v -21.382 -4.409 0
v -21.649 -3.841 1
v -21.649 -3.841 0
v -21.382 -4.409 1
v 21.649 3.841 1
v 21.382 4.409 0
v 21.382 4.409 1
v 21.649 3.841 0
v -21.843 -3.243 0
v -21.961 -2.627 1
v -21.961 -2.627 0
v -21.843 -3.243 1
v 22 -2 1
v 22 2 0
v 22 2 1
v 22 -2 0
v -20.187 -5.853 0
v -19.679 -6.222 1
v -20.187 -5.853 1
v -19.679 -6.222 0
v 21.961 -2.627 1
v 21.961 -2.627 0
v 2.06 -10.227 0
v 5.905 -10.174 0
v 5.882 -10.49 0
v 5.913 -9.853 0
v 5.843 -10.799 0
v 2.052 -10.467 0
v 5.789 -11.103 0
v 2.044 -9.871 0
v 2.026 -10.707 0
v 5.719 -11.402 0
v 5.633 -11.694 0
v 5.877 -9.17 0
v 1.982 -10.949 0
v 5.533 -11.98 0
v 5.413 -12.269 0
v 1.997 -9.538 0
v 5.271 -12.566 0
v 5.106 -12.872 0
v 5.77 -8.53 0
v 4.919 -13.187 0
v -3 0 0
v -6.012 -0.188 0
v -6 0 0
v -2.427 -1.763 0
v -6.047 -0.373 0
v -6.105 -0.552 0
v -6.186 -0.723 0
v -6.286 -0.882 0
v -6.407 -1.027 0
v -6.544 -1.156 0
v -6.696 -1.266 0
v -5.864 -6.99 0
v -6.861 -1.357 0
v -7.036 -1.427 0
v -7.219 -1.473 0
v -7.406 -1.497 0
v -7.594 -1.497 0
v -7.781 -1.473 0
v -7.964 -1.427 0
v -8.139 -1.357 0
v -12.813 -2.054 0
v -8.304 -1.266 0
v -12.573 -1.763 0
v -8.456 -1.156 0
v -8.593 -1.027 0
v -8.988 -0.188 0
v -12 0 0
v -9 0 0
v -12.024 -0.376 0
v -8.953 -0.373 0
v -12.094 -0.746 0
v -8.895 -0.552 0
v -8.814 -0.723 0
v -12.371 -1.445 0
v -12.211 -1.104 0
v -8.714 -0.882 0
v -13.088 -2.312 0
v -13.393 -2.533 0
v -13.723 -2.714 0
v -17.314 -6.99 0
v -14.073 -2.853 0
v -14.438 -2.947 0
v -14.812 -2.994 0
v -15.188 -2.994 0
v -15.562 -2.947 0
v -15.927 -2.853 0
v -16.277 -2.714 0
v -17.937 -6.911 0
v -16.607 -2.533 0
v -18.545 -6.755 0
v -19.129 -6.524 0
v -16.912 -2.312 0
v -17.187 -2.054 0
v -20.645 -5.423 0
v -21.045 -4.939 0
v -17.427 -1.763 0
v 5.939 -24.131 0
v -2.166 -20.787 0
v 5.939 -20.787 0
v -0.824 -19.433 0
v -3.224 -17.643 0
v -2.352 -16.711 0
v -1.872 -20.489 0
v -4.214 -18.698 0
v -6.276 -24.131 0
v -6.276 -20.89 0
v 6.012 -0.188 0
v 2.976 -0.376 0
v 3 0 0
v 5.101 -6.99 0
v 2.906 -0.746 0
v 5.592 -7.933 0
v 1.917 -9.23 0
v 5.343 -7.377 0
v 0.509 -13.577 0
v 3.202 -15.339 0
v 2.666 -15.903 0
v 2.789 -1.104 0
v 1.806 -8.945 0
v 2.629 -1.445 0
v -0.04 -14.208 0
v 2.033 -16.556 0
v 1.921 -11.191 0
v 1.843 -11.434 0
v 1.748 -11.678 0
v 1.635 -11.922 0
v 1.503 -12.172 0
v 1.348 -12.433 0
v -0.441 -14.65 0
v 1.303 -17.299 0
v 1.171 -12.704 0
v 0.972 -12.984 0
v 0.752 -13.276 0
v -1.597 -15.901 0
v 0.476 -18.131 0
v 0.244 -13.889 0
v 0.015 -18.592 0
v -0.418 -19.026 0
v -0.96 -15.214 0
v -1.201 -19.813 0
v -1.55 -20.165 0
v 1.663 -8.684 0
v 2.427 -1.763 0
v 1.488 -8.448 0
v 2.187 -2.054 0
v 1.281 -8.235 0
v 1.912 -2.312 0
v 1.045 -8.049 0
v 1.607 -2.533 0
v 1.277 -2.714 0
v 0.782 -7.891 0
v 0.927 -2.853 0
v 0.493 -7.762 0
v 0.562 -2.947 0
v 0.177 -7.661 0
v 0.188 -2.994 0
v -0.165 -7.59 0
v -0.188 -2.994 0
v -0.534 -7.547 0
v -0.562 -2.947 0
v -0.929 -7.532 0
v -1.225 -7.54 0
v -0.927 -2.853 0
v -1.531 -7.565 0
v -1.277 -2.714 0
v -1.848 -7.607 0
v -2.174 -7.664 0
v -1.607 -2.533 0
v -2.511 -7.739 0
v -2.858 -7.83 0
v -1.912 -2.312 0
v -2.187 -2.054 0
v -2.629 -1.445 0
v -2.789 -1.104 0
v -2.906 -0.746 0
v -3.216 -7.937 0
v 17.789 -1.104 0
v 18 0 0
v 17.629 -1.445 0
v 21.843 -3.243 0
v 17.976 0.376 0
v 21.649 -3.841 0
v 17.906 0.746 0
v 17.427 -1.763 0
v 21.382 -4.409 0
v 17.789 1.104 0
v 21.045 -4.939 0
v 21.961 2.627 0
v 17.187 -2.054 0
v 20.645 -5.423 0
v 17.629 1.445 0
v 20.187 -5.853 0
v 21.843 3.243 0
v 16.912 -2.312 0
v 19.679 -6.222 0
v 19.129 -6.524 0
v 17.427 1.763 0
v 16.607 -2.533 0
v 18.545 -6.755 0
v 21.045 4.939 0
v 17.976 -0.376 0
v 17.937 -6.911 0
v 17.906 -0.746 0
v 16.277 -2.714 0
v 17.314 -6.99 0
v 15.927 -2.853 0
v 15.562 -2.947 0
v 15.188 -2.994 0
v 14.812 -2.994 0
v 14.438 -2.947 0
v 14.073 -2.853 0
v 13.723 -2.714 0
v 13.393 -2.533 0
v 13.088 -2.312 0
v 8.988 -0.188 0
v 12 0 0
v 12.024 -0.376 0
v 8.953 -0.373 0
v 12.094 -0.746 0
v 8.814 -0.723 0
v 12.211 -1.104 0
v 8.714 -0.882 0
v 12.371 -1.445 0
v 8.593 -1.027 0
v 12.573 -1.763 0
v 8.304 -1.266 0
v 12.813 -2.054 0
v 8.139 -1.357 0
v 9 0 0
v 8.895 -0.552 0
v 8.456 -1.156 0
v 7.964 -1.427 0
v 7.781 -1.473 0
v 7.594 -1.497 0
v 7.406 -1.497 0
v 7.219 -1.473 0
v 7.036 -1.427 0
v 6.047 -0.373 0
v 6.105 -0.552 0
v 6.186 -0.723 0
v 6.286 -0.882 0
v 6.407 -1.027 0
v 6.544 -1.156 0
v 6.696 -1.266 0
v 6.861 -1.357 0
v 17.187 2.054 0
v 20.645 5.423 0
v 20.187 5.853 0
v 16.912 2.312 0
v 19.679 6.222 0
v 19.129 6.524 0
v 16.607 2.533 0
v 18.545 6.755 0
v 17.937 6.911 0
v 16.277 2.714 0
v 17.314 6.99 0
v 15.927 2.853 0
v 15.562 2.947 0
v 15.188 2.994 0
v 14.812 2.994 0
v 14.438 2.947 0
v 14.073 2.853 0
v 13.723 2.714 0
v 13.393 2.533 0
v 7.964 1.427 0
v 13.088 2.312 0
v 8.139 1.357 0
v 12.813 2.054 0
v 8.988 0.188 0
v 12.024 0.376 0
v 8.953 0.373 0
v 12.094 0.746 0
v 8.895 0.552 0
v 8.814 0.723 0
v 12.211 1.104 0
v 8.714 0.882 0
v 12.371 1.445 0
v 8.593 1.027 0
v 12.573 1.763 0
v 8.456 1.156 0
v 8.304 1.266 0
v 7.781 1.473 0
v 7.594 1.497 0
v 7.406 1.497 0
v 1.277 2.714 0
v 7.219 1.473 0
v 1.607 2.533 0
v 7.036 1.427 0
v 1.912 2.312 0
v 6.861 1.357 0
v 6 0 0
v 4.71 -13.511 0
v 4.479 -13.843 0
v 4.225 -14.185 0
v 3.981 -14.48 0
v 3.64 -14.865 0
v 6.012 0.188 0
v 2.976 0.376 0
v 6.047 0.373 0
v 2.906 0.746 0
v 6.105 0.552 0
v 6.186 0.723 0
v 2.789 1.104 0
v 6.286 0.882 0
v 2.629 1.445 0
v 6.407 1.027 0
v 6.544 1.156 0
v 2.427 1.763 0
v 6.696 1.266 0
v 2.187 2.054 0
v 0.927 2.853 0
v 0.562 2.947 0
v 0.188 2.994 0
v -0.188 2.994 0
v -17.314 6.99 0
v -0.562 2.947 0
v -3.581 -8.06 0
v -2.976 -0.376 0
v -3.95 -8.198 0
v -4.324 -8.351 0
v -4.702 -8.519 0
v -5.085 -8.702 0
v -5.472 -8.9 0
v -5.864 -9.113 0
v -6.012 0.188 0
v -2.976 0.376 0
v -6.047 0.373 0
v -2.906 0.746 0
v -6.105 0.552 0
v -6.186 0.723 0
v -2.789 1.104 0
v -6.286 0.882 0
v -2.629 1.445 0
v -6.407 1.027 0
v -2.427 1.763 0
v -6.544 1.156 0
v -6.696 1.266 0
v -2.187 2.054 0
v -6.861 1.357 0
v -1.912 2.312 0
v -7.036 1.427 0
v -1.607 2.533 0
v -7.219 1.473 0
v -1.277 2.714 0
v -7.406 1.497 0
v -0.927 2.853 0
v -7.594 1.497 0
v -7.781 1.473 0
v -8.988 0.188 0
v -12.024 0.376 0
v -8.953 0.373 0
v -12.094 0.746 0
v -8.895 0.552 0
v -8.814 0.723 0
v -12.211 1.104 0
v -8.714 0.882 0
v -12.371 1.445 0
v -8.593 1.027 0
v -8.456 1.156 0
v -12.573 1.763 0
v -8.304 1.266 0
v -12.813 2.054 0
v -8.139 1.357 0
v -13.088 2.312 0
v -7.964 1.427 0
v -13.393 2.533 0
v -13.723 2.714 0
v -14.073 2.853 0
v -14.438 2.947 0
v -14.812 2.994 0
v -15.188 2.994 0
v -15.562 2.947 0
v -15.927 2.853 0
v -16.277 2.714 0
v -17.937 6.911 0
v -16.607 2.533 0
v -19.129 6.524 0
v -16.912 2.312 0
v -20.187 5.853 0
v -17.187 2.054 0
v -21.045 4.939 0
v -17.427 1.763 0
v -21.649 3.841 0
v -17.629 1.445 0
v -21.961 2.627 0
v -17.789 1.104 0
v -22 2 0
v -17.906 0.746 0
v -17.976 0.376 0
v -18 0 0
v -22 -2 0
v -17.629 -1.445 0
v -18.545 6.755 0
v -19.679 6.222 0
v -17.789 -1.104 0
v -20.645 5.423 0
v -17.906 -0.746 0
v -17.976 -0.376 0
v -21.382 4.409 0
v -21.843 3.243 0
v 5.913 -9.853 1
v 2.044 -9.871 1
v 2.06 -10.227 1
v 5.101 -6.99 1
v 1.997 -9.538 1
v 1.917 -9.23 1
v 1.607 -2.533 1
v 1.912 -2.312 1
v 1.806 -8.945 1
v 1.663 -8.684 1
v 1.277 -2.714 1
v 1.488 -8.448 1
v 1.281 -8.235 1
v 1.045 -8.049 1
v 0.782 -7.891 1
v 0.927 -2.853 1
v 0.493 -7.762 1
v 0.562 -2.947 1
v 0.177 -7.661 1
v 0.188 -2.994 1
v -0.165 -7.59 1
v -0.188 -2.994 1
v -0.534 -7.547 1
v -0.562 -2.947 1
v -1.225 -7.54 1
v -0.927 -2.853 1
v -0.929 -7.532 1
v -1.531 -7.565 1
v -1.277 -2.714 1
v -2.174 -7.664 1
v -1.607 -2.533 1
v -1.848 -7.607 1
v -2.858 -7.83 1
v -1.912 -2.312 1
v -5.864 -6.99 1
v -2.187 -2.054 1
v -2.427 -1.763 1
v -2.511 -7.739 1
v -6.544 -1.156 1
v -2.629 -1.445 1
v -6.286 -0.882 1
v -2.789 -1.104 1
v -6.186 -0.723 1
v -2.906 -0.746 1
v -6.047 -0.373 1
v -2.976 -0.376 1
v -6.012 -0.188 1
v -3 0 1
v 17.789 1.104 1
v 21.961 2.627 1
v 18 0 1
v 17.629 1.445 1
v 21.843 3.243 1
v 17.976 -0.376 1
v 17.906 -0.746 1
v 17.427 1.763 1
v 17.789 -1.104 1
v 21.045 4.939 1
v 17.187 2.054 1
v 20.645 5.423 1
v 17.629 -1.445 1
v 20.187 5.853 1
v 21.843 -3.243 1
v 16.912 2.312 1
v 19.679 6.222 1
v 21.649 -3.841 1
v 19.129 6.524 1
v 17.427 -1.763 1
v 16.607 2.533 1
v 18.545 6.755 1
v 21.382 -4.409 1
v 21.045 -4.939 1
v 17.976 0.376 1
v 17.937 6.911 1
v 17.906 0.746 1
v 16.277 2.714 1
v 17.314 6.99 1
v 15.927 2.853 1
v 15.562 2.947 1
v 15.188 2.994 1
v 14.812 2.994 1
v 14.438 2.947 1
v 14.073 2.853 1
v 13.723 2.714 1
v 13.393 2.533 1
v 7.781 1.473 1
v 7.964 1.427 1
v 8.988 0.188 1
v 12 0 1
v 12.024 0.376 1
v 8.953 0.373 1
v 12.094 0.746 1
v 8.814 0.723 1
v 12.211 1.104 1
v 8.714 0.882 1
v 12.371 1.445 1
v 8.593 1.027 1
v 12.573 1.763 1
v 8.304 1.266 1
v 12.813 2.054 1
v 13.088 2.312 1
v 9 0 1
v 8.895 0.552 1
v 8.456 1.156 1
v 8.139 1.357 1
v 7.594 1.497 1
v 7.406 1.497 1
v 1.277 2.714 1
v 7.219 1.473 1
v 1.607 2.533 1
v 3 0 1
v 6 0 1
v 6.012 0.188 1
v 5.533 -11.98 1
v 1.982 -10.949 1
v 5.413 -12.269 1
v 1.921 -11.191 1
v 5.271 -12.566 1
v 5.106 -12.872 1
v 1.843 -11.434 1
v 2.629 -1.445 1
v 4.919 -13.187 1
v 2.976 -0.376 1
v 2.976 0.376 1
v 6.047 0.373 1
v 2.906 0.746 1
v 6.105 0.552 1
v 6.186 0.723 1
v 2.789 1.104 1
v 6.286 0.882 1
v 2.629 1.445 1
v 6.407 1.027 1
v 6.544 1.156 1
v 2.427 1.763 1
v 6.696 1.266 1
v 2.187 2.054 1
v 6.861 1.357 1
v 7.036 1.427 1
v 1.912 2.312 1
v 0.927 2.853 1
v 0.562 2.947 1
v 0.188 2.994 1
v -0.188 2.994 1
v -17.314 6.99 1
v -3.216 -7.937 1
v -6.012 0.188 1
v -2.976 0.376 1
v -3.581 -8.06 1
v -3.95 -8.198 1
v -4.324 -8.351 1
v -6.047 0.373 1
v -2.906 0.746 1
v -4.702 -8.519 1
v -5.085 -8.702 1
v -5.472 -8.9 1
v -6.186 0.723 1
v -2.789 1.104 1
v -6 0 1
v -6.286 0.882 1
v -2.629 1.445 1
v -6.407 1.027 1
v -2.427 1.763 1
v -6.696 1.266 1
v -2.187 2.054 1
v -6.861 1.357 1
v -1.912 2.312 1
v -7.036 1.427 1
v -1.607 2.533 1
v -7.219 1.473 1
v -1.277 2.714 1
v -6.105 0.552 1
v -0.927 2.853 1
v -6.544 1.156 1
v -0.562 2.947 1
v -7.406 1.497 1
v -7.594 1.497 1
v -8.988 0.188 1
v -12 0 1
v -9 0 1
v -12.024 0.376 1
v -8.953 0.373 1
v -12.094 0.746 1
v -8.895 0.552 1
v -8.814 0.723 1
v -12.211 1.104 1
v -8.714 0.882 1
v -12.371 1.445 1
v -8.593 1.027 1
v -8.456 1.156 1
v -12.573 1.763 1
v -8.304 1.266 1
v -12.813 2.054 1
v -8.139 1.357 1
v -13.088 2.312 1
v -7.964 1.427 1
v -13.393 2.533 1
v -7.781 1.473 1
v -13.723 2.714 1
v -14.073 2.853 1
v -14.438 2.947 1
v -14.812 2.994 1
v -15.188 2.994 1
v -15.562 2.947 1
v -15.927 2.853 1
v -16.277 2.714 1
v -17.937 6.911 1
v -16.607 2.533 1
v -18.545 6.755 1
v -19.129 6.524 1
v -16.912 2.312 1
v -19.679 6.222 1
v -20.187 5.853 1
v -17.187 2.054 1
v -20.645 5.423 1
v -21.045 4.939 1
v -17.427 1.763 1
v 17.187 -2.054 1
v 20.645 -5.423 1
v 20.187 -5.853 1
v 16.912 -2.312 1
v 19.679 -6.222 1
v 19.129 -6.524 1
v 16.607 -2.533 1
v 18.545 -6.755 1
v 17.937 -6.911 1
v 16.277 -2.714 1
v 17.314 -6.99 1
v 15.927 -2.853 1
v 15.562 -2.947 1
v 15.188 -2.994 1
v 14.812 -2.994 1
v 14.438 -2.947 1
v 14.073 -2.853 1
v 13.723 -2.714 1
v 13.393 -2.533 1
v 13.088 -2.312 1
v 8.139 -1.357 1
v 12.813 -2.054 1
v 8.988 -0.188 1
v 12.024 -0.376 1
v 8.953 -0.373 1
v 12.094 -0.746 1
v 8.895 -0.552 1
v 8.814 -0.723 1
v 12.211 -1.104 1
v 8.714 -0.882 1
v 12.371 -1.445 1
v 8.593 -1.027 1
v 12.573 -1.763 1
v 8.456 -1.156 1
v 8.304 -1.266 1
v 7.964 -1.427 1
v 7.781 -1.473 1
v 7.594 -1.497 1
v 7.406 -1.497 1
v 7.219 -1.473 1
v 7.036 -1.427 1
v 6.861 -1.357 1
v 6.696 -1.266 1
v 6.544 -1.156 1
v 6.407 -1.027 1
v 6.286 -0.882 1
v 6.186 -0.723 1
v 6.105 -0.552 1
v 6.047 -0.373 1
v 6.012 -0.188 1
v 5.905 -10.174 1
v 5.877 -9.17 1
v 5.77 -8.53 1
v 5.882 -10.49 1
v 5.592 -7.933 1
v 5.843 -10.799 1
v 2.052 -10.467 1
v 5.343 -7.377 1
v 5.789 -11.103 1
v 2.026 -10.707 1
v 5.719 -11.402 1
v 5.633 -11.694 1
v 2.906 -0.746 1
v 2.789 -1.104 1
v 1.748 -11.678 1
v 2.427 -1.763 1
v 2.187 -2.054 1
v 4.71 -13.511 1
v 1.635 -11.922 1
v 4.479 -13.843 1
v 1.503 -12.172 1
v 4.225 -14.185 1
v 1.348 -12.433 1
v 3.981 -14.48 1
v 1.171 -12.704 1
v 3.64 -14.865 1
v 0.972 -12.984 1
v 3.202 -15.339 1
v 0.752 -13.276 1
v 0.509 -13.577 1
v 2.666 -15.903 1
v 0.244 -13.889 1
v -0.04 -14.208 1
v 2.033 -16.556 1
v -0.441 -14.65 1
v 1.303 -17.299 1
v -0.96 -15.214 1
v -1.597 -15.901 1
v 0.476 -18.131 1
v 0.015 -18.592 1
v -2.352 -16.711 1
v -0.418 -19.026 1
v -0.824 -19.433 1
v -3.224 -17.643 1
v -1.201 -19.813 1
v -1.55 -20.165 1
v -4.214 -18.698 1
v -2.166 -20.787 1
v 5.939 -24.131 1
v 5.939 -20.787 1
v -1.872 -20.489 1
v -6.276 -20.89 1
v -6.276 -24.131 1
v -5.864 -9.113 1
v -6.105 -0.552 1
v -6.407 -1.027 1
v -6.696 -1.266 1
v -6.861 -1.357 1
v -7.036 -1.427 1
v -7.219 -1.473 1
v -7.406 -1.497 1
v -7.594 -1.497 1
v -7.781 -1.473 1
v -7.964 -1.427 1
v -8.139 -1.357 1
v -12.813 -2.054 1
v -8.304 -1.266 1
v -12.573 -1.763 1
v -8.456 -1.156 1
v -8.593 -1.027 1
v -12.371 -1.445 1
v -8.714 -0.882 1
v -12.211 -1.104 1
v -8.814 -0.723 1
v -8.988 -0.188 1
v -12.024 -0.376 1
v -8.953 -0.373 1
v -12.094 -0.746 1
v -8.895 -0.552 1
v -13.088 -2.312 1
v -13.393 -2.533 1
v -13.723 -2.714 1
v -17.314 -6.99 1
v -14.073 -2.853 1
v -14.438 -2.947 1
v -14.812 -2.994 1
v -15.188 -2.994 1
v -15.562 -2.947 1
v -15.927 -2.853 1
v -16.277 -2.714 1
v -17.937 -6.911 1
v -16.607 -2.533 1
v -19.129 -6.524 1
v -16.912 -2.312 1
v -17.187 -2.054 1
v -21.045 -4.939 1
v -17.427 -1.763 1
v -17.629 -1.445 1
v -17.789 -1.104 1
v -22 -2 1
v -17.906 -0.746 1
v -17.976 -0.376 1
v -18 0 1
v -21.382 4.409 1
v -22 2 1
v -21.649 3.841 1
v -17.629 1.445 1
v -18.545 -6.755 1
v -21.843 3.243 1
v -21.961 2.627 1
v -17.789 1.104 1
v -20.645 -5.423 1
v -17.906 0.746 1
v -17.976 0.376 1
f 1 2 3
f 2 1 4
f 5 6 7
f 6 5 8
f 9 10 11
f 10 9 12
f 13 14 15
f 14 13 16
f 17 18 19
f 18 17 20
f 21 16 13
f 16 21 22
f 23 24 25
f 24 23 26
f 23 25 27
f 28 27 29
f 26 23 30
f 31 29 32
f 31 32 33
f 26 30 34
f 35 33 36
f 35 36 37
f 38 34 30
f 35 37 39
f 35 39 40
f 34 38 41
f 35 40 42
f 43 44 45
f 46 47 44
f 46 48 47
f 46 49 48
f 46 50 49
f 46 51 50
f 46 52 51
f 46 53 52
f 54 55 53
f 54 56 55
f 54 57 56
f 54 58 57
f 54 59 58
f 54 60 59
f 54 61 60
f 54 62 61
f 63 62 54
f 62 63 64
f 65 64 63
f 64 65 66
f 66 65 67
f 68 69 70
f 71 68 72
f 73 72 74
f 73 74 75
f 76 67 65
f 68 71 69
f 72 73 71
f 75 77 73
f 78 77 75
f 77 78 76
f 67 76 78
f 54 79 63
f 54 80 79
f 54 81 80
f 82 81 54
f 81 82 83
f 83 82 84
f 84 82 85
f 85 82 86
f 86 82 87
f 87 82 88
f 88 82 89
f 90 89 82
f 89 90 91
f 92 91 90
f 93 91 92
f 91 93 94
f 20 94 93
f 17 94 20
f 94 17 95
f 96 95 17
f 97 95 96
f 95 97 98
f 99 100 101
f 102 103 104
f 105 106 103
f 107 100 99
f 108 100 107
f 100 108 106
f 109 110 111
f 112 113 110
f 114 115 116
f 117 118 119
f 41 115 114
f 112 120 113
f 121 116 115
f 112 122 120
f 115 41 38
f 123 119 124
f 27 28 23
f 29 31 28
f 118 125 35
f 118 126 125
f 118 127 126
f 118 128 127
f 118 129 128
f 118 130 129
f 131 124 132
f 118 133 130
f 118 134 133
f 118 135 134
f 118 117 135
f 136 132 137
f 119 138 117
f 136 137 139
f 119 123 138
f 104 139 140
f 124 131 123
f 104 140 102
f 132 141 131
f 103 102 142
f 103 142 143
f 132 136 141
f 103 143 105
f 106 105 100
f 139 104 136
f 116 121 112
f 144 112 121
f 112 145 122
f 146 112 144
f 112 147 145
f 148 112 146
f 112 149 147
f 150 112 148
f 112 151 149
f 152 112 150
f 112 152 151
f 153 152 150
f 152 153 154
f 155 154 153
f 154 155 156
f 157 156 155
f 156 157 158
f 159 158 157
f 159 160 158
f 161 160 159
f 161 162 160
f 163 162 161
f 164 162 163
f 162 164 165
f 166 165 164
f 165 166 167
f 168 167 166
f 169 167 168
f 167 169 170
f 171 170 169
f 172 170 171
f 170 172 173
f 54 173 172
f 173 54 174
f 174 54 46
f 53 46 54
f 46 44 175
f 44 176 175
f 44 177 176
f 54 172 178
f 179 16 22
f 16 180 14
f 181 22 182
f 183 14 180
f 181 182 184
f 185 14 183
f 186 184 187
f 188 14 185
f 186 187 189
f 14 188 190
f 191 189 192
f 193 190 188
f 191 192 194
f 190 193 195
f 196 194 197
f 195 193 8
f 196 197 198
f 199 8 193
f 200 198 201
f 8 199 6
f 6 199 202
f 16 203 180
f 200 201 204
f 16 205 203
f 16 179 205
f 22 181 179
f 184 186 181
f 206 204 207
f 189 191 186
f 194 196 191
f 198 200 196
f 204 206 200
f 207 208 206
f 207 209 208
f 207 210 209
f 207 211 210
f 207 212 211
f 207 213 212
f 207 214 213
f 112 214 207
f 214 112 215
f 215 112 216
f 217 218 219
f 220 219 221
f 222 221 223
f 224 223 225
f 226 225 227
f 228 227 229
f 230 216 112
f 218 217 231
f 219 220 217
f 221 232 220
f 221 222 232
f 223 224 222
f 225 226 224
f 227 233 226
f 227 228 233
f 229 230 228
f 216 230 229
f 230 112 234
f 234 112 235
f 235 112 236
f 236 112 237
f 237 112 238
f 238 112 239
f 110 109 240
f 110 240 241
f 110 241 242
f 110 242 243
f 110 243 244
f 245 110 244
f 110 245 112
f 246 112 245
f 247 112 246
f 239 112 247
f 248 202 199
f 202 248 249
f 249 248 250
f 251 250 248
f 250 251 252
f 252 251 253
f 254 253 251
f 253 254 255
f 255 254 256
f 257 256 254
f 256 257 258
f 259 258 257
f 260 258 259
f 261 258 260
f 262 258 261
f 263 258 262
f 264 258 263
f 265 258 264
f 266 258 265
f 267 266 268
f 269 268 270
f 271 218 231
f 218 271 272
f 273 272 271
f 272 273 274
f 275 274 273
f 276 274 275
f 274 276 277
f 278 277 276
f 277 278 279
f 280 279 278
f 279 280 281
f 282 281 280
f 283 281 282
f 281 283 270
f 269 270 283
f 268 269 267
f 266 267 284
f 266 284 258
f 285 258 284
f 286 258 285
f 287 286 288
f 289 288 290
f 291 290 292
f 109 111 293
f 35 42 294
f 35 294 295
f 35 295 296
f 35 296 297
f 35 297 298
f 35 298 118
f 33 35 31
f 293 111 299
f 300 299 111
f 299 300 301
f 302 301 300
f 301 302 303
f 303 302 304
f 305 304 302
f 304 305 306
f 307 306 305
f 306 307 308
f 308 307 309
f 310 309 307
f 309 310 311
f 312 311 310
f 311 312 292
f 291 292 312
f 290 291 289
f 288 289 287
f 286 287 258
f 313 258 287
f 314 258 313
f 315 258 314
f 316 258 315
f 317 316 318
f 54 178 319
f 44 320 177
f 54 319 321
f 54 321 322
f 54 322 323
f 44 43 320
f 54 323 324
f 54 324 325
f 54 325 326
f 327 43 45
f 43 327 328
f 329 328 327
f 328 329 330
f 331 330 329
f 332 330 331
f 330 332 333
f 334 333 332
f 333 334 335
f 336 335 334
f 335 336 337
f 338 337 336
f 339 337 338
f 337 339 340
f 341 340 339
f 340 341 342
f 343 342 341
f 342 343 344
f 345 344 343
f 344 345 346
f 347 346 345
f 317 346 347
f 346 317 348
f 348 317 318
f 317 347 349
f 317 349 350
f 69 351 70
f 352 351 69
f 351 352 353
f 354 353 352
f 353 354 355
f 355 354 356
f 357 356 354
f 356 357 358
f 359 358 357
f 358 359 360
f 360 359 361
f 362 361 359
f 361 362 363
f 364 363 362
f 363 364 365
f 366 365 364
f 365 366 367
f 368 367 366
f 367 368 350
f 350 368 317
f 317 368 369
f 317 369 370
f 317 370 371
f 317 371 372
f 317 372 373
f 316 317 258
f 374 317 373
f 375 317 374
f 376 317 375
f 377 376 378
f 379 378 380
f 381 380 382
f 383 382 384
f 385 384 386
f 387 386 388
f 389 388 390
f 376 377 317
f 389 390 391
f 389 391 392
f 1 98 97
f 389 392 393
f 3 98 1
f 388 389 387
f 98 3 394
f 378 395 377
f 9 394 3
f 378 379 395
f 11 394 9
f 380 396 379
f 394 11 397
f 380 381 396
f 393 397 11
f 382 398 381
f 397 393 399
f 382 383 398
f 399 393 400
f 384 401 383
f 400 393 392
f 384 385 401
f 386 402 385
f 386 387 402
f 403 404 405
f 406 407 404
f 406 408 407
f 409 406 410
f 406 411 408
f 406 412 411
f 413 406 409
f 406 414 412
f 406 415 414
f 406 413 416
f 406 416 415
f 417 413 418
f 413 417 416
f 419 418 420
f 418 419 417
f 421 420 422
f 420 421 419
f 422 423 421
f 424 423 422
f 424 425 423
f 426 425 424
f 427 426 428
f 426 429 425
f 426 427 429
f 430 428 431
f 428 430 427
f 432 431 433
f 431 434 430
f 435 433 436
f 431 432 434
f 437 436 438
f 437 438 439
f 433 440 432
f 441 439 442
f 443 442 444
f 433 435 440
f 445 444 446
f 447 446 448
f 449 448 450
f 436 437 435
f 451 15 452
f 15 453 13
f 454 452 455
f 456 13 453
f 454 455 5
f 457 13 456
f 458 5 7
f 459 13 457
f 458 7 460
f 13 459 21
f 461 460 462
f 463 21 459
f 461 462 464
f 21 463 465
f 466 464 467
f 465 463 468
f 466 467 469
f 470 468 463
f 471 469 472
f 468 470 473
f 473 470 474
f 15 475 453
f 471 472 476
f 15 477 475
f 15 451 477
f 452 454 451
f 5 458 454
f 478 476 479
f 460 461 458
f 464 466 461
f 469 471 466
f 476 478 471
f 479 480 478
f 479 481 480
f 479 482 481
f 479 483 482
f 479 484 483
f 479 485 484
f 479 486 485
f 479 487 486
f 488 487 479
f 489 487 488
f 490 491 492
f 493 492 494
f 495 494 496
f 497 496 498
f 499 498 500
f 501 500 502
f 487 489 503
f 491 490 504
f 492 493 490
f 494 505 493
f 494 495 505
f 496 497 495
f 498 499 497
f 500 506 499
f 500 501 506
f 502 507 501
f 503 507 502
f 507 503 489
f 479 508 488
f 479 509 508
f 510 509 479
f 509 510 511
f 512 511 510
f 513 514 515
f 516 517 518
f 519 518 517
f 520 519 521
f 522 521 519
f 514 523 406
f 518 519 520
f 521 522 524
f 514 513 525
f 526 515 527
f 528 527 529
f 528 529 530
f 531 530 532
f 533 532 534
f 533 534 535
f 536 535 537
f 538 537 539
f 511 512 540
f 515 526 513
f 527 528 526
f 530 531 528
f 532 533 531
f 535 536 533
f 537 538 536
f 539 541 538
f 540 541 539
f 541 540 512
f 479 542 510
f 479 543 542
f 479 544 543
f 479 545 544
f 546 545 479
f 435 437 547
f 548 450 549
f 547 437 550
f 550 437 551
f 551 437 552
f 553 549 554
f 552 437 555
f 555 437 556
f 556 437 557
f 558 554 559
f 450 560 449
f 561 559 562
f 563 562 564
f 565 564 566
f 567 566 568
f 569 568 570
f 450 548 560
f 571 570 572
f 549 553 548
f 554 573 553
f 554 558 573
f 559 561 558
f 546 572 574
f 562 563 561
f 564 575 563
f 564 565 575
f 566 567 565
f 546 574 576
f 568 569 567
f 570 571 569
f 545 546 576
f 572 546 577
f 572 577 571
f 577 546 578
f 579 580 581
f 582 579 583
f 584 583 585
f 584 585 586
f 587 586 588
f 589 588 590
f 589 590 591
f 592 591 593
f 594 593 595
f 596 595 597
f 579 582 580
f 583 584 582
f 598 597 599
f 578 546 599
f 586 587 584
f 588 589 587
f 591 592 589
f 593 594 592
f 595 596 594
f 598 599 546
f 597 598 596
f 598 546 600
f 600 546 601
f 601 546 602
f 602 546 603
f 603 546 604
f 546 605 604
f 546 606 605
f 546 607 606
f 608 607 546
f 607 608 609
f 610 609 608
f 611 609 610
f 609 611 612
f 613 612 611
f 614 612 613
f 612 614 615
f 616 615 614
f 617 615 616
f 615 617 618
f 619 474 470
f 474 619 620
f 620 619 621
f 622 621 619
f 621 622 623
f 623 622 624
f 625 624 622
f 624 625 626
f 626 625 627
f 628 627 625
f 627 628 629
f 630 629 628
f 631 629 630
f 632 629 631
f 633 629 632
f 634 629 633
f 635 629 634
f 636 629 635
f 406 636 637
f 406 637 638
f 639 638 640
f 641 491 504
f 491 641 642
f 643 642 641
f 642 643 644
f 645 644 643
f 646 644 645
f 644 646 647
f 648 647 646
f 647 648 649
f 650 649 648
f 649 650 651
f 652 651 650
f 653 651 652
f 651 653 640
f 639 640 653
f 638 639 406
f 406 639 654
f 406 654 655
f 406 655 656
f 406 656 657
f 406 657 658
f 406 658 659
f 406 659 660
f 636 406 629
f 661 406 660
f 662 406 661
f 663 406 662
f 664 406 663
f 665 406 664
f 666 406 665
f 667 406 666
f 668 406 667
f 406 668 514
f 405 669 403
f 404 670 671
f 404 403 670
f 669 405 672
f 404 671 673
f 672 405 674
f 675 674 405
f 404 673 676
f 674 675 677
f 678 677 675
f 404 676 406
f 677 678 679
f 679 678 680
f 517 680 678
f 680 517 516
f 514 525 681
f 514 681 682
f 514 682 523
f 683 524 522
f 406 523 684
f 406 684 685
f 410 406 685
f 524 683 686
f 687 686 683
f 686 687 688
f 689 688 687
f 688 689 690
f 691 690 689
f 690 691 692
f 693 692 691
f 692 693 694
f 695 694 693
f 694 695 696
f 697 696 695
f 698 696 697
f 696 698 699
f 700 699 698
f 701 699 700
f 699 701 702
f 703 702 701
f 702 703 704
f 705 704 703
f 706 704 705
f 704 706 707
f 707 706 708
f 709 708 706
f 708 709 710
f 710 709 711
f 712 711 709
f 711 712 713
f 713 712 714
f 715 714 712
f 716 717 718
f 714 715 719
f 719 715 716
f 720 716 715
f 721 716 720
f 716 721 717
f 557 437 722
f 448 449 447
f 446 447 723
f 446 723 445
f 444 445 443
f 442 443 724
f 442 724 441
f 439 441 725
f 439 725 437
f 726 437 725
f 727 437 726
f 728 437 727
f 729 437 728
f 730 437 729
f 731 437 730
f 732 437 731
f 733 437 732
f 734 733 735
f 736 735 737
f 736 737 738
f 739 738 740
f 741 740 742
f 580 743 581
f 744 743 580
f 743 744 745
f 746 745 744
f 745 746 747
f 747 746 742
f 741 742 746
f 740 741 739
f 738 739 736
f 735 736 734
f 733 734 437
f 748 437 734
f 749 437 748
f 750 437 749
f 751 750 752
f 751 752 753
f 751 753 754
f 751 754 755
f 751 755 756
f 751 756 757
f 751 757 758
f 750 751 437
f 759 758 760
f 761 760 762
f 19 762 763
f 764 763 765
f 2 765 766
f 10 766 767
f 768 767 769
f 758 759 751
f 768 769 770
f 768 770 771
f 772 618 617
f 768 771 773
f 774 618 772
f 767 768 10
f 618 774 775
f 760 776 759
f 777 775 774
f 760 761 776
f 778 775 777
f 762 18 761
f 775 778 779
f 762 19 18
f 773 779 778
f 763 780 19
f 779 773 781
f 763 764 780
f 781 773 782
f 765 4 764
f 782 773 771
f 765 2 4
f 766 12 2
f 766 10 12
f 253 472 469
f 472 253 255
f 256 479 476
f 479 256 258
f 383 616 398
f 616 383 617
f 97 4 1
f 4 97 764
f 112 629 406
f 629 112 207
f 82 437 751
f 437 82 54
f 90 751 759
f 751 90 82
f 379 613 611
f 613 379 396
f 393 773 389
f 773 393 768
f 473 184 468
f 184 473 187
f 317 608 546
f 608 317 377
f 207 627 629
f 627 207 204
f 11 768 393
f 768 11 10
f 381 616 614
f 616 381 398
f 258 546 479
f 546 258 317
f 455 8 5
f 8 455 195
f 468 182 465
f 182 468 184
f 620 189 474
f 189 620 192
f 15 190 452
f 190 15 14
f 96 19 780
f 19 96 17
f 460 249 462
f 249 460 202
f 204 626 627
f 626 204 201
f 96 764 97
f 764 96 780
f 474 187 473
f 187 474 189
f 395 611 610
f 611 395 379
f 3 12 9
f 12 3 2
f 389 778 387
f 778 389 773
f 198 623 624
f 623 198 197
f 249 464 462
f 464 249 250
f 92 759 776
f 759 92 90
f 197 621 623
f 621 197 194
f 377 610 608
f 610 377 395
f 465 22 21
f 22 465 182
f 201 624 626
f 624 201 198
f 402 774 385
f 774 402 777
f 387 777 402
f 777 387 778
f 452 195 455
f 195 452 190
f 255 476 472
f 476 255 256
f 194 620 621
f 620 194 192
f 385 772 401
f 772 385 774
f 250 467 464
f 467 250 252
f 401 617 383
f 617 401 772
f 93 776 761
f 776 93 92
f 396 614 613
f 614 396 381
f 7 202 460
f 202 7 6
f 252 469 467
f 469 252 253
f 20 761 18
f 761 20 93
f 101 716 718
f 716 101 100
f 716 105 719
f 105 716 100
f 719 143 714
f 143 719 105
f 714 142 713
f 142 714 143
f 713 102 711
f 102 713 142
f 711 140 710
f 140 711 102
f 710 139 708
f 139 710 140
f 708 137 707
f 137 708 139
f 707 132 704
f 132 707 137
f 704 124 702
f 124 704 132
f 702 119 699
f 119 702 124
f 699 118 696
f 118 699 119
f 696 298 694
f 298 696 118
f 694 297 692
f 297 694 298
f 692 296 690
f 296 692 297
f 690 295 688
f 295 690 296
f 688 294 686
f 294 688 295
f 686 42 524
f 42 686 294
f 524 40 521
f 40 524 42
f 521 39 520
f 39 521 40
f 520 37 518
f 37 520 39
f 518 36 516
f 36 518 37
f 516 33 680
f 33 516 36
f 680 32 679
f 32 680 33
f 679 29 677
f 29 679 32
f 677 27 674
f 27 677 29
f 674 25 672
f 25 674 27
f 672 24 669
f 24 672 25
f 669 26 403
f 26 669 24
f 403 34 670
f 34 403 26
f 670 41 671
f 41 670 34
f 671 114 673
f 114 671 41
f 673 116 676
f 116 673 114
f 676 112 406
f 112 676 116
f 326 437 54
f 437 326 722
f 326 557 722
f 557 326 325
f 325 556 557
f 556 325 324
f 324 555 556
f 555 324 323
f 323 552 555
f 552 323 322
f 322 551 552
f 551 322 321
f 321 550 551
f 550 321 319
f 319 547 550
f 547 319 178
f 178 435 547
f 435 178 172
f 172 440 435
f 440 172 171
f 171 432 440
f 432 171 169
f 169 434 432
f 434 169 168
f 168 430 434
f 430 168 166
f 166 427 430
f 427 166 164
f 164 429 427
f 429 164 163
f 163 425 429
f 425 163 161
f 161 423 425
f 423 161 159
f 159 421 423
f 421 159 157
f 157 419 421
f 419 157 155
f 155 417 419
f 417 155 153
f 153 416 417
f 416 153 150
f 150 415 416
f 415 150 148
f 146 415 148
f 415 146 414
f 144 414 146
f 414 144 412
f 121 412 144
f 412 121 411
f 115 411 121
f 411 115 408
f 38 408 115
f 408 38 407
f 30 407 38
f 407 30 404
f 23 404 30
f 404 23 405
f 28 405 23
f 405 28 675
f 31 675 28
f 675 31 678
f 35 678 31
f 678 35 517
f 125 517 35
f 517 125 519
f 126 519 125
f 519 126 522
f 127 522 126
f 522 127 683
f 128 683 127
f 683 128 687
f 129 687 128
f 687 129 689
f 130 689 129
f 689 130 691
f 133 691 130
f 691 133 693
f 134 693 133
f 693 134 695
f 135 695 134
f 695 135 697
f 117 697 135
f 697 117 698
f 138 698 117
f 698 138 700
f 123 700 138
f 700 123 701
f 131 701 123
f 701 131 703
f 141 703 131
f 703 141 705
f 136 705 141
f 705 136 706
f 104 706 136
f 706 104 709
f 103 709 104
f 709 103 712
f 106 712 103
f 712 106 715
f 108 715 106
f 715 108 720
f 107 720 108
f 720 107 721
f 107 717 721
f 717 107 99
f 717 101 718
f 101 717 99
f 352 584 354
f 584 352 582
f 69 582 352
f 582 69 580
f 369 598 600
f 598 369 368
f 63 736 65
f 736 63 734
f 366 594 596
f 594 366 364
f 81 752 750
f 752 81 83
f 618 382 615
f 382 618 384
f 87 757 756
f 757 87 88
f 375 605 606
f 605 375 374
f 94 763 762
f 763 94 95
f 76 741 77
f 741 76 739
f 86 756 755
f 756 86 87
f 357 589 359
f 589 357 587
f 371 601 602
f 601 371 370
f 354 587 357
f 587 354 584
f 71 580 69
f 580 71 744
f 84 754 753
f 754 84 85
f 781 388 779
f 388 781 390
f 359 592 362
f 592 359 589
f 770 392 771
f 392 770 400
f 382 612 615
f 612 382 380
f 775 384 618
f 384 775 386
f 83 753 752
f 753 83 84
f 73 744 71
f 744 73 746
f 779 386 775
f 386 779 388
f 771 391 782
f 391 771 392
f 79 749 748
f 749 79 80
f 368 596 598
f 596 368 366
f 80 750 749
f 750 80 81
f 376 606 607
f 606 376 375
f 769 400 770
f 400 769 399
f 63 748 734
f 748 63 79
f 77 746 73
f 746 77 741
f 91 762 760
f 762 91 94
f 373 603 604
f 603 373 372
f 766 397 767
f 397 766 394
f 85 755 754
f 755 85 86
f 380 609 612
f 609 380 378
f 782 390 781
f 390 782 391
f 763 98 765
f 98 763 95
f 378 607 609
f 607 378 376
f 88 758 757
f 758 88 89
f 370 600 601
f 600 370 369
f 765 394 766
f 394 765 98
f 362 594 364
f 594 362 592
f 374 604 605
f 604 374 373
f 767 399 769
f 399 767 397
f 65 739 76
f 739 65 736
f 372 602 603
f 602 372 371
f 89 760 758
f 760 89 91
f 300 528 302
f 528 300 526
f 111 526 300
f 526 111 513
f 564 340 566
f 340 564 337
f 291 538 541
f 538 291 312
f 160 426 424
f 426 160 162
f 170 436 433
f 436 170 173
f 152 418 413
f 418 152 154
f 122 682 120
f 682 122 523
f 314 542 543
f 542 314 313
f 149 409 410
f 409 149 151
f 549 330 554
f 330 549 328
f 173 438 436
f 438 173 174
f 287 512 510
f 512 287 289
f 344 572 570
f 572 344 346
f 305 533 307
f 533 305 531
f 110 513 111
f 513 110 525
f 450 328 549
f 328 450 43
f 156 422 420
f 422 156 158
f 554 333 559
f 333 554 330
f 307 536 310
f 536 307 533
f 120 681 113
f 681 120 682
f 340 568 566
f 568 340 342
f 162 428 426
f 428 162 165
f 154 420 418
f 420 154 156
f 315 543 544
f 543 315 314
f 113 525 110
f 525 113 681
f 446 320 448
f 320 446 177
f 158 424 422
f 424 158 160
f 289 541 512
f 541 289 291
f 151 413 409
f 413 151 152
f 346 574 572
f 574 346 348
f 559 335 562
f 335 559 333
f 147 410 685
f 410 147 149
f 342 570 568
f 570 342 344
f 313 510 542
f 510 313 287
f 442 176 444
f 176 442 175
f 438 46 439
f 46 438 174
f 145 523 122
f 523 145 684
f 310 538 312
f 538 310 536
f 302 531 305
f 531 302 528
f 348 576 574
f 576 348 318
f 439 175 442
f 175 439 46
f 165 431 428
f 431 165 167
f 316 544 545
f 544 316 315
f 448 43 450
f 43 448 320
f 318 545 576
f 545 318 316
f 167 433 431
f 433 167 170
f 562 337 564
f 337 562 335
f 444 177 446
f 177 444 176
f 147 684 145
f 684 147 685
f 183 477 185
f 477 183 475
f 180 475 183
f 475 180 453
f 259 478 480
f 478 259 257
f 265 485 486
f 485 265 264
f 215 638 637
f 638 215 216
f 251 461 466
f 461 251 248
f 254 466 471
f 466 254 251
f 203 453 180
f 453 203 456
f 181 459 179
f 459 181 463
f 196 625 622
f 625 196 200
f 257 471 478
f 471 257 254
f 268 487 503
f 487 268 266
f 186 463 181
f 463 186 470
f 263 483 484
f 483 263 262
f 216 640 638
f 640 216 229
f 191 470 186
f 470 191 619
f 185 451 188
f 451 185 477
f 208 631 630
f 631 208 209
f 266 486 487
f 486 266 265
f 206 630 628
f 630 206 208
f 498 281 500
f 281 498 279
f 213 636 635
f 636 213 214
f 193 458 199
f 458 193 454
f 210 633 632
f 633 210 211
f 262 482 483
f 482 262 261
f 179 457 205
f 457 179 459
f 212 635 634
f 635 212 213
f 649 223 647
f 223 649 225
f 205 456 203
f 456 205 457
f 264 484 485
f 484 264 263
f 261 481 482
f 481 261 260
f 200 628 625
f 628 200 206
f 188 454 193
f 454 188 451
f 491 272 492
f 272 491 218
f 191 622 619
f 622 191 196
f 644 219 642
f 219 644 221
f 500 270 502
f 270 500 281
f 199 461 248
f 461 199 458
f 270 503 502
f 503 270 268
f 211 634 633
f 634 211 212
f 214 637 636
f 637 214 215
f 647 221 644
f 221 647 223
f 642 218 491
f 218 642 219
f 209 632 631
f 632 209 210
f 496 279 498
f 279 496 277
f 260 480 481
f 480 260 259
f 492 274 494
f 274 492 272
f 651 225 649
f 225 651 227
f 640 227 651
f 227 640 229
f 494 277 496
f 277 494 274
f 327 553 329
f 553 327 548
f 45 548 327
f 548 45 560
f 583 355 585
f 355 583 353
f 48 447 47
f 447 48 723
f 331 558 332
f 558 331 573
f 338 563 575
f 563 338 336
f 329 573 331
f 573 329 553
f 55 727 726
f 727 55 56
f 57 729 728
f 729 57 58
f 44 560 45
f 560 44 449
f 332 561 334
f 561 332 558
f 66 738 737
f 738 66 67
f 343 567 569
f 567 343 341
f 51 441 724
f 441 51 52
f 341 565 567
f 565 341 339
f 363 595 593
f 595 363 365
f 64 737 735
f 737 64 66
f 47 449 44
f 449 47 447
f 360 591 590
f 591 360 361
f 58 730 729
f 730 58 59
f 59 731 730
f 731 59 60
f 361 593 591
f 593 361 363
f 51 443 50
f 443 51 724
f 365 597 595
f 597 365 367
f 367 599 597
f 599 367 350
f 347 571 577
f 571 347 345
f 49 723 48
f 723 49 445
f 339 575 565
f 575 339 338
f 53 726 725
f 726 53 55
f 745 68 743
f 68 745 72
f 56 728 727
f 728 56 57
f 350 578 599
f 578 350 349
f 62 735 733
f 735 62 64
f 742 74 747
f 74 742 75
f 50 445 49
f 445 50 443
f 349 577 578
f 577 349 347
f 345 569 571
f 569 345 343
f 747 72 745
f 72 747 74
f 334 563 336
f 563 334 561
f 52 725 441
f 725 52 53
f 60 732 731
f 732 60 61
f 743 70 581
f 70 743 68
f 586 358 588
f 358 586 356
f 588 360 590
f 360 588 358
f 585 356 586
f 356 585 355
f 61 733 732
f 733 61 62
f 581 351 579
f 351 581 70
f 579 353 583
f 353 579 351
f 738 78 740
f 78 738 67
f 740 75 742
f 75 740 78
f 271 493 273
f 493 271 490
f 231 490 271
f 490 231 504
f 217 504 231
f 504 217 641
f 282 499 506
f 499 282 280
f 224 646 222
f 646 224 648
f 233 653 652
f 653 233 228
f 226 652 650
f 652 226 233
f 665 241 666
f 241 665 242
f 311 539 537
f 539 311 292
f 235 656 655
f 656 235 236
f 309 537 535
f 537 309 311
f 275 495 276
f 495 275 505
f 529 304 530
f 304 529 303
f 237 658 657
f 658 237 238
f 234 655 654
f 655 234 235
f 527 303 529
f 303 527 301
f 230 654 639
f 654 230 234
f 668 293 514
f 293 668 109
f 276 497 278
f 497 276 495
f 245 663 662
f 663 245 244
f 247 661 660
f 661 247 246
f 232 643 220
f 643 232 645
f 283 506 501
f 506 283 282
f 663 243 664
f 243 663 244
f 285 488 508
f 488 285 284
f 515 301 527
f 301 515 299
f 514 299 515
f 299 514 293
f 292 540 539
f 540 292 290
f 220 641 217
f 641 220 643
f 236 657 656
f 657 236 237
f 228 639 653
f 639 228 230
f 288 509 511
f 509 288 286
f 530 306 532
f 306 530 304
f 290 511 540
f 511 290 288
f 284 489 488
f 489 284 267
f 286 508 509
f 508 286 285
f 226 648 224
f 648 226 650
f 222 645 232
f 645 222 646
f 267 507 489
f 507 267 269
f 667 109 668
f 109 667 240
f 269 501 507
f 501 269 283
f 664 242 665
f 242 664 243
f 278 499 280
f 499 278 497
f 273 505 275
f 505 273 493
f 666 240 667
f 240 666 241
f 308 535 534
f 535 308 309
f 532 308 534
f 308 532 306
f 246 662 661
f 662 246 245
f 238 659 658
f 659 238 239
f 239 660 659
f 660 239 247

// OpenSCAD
$fn = 50;


difference() {
	union() {
		hull() {
			translate(v = [-17.0000000000, 2.0000000000, 0]) {
				cylinder(h = 1, r = 5);
			}
			translate(v = [17.0000000000, 2.0000000000, 0]) {
				cylinder(h = 1, r = 5);
			}
			translate(v = [-17.0000000000, -2.0000000000, 0]) {
				cylinder(h = 1, r = 5);
			}
			translate(v = [17.0000000000, -2.0000000000, 0]) {
				cylinder(h = 1, r = 5);
			}
		}
		translate(v = [0, -5, 0]) {
			linear_extrude(height = 1) {
				text(font = "DejaVu Sans Mono:style=Bold", halign = "center", size = 19.0000000000, text = "2", valign = "top");
			}
		}
	}
	union() {
		translate(v = [-15.0000000000, 0.0000000000, 0]) {
			translate(v = [0, 0, -100]) {
				cylinder(h = 200, r = 3.0000000000);
			}
		}
		translate(v = [0, 0, -100]) {
			cylinder(h = 200, r = 3.0000000000);
		}
		translate(v = [15.0000000000, 0.0000000000, 0]) {
			translate(v = [0, 0, -100]) {
				cylinder(h = 200, r = 3.0000000000);
			}
		}
		translate(v = [-15.0000000000, 0.0000000000, 0]) {
			translate(v = [0, 0, -100]) {
				cylinder(h = 200, r = 1.5000000000);
			}
		}
		translate(v = [-7.5000000000, 0.0000000000, 0]) {
			translate(v = [0, 0, -100]) {
				cylinder(h = 200, r = 1.5000000000);
			}
		}
		translate(v = [0, 0, -100]) {
			cylinder(h = 200, r = 1.5000000000);
		}
		translate(v = [7.5000000000, 0.0000000000, 0]) {
			translate(v = [0, 0, -100]) {
				cylinder(h = 200, r = 1.5000000000);
			}
		}
		translate(v = [15.0000000000, 0.0000000000, 0]) {
			translate(v = [0, 0, -100]) {
				cylinder(h = 200, r = 1.5000000000);
			}
		}
	}
}
